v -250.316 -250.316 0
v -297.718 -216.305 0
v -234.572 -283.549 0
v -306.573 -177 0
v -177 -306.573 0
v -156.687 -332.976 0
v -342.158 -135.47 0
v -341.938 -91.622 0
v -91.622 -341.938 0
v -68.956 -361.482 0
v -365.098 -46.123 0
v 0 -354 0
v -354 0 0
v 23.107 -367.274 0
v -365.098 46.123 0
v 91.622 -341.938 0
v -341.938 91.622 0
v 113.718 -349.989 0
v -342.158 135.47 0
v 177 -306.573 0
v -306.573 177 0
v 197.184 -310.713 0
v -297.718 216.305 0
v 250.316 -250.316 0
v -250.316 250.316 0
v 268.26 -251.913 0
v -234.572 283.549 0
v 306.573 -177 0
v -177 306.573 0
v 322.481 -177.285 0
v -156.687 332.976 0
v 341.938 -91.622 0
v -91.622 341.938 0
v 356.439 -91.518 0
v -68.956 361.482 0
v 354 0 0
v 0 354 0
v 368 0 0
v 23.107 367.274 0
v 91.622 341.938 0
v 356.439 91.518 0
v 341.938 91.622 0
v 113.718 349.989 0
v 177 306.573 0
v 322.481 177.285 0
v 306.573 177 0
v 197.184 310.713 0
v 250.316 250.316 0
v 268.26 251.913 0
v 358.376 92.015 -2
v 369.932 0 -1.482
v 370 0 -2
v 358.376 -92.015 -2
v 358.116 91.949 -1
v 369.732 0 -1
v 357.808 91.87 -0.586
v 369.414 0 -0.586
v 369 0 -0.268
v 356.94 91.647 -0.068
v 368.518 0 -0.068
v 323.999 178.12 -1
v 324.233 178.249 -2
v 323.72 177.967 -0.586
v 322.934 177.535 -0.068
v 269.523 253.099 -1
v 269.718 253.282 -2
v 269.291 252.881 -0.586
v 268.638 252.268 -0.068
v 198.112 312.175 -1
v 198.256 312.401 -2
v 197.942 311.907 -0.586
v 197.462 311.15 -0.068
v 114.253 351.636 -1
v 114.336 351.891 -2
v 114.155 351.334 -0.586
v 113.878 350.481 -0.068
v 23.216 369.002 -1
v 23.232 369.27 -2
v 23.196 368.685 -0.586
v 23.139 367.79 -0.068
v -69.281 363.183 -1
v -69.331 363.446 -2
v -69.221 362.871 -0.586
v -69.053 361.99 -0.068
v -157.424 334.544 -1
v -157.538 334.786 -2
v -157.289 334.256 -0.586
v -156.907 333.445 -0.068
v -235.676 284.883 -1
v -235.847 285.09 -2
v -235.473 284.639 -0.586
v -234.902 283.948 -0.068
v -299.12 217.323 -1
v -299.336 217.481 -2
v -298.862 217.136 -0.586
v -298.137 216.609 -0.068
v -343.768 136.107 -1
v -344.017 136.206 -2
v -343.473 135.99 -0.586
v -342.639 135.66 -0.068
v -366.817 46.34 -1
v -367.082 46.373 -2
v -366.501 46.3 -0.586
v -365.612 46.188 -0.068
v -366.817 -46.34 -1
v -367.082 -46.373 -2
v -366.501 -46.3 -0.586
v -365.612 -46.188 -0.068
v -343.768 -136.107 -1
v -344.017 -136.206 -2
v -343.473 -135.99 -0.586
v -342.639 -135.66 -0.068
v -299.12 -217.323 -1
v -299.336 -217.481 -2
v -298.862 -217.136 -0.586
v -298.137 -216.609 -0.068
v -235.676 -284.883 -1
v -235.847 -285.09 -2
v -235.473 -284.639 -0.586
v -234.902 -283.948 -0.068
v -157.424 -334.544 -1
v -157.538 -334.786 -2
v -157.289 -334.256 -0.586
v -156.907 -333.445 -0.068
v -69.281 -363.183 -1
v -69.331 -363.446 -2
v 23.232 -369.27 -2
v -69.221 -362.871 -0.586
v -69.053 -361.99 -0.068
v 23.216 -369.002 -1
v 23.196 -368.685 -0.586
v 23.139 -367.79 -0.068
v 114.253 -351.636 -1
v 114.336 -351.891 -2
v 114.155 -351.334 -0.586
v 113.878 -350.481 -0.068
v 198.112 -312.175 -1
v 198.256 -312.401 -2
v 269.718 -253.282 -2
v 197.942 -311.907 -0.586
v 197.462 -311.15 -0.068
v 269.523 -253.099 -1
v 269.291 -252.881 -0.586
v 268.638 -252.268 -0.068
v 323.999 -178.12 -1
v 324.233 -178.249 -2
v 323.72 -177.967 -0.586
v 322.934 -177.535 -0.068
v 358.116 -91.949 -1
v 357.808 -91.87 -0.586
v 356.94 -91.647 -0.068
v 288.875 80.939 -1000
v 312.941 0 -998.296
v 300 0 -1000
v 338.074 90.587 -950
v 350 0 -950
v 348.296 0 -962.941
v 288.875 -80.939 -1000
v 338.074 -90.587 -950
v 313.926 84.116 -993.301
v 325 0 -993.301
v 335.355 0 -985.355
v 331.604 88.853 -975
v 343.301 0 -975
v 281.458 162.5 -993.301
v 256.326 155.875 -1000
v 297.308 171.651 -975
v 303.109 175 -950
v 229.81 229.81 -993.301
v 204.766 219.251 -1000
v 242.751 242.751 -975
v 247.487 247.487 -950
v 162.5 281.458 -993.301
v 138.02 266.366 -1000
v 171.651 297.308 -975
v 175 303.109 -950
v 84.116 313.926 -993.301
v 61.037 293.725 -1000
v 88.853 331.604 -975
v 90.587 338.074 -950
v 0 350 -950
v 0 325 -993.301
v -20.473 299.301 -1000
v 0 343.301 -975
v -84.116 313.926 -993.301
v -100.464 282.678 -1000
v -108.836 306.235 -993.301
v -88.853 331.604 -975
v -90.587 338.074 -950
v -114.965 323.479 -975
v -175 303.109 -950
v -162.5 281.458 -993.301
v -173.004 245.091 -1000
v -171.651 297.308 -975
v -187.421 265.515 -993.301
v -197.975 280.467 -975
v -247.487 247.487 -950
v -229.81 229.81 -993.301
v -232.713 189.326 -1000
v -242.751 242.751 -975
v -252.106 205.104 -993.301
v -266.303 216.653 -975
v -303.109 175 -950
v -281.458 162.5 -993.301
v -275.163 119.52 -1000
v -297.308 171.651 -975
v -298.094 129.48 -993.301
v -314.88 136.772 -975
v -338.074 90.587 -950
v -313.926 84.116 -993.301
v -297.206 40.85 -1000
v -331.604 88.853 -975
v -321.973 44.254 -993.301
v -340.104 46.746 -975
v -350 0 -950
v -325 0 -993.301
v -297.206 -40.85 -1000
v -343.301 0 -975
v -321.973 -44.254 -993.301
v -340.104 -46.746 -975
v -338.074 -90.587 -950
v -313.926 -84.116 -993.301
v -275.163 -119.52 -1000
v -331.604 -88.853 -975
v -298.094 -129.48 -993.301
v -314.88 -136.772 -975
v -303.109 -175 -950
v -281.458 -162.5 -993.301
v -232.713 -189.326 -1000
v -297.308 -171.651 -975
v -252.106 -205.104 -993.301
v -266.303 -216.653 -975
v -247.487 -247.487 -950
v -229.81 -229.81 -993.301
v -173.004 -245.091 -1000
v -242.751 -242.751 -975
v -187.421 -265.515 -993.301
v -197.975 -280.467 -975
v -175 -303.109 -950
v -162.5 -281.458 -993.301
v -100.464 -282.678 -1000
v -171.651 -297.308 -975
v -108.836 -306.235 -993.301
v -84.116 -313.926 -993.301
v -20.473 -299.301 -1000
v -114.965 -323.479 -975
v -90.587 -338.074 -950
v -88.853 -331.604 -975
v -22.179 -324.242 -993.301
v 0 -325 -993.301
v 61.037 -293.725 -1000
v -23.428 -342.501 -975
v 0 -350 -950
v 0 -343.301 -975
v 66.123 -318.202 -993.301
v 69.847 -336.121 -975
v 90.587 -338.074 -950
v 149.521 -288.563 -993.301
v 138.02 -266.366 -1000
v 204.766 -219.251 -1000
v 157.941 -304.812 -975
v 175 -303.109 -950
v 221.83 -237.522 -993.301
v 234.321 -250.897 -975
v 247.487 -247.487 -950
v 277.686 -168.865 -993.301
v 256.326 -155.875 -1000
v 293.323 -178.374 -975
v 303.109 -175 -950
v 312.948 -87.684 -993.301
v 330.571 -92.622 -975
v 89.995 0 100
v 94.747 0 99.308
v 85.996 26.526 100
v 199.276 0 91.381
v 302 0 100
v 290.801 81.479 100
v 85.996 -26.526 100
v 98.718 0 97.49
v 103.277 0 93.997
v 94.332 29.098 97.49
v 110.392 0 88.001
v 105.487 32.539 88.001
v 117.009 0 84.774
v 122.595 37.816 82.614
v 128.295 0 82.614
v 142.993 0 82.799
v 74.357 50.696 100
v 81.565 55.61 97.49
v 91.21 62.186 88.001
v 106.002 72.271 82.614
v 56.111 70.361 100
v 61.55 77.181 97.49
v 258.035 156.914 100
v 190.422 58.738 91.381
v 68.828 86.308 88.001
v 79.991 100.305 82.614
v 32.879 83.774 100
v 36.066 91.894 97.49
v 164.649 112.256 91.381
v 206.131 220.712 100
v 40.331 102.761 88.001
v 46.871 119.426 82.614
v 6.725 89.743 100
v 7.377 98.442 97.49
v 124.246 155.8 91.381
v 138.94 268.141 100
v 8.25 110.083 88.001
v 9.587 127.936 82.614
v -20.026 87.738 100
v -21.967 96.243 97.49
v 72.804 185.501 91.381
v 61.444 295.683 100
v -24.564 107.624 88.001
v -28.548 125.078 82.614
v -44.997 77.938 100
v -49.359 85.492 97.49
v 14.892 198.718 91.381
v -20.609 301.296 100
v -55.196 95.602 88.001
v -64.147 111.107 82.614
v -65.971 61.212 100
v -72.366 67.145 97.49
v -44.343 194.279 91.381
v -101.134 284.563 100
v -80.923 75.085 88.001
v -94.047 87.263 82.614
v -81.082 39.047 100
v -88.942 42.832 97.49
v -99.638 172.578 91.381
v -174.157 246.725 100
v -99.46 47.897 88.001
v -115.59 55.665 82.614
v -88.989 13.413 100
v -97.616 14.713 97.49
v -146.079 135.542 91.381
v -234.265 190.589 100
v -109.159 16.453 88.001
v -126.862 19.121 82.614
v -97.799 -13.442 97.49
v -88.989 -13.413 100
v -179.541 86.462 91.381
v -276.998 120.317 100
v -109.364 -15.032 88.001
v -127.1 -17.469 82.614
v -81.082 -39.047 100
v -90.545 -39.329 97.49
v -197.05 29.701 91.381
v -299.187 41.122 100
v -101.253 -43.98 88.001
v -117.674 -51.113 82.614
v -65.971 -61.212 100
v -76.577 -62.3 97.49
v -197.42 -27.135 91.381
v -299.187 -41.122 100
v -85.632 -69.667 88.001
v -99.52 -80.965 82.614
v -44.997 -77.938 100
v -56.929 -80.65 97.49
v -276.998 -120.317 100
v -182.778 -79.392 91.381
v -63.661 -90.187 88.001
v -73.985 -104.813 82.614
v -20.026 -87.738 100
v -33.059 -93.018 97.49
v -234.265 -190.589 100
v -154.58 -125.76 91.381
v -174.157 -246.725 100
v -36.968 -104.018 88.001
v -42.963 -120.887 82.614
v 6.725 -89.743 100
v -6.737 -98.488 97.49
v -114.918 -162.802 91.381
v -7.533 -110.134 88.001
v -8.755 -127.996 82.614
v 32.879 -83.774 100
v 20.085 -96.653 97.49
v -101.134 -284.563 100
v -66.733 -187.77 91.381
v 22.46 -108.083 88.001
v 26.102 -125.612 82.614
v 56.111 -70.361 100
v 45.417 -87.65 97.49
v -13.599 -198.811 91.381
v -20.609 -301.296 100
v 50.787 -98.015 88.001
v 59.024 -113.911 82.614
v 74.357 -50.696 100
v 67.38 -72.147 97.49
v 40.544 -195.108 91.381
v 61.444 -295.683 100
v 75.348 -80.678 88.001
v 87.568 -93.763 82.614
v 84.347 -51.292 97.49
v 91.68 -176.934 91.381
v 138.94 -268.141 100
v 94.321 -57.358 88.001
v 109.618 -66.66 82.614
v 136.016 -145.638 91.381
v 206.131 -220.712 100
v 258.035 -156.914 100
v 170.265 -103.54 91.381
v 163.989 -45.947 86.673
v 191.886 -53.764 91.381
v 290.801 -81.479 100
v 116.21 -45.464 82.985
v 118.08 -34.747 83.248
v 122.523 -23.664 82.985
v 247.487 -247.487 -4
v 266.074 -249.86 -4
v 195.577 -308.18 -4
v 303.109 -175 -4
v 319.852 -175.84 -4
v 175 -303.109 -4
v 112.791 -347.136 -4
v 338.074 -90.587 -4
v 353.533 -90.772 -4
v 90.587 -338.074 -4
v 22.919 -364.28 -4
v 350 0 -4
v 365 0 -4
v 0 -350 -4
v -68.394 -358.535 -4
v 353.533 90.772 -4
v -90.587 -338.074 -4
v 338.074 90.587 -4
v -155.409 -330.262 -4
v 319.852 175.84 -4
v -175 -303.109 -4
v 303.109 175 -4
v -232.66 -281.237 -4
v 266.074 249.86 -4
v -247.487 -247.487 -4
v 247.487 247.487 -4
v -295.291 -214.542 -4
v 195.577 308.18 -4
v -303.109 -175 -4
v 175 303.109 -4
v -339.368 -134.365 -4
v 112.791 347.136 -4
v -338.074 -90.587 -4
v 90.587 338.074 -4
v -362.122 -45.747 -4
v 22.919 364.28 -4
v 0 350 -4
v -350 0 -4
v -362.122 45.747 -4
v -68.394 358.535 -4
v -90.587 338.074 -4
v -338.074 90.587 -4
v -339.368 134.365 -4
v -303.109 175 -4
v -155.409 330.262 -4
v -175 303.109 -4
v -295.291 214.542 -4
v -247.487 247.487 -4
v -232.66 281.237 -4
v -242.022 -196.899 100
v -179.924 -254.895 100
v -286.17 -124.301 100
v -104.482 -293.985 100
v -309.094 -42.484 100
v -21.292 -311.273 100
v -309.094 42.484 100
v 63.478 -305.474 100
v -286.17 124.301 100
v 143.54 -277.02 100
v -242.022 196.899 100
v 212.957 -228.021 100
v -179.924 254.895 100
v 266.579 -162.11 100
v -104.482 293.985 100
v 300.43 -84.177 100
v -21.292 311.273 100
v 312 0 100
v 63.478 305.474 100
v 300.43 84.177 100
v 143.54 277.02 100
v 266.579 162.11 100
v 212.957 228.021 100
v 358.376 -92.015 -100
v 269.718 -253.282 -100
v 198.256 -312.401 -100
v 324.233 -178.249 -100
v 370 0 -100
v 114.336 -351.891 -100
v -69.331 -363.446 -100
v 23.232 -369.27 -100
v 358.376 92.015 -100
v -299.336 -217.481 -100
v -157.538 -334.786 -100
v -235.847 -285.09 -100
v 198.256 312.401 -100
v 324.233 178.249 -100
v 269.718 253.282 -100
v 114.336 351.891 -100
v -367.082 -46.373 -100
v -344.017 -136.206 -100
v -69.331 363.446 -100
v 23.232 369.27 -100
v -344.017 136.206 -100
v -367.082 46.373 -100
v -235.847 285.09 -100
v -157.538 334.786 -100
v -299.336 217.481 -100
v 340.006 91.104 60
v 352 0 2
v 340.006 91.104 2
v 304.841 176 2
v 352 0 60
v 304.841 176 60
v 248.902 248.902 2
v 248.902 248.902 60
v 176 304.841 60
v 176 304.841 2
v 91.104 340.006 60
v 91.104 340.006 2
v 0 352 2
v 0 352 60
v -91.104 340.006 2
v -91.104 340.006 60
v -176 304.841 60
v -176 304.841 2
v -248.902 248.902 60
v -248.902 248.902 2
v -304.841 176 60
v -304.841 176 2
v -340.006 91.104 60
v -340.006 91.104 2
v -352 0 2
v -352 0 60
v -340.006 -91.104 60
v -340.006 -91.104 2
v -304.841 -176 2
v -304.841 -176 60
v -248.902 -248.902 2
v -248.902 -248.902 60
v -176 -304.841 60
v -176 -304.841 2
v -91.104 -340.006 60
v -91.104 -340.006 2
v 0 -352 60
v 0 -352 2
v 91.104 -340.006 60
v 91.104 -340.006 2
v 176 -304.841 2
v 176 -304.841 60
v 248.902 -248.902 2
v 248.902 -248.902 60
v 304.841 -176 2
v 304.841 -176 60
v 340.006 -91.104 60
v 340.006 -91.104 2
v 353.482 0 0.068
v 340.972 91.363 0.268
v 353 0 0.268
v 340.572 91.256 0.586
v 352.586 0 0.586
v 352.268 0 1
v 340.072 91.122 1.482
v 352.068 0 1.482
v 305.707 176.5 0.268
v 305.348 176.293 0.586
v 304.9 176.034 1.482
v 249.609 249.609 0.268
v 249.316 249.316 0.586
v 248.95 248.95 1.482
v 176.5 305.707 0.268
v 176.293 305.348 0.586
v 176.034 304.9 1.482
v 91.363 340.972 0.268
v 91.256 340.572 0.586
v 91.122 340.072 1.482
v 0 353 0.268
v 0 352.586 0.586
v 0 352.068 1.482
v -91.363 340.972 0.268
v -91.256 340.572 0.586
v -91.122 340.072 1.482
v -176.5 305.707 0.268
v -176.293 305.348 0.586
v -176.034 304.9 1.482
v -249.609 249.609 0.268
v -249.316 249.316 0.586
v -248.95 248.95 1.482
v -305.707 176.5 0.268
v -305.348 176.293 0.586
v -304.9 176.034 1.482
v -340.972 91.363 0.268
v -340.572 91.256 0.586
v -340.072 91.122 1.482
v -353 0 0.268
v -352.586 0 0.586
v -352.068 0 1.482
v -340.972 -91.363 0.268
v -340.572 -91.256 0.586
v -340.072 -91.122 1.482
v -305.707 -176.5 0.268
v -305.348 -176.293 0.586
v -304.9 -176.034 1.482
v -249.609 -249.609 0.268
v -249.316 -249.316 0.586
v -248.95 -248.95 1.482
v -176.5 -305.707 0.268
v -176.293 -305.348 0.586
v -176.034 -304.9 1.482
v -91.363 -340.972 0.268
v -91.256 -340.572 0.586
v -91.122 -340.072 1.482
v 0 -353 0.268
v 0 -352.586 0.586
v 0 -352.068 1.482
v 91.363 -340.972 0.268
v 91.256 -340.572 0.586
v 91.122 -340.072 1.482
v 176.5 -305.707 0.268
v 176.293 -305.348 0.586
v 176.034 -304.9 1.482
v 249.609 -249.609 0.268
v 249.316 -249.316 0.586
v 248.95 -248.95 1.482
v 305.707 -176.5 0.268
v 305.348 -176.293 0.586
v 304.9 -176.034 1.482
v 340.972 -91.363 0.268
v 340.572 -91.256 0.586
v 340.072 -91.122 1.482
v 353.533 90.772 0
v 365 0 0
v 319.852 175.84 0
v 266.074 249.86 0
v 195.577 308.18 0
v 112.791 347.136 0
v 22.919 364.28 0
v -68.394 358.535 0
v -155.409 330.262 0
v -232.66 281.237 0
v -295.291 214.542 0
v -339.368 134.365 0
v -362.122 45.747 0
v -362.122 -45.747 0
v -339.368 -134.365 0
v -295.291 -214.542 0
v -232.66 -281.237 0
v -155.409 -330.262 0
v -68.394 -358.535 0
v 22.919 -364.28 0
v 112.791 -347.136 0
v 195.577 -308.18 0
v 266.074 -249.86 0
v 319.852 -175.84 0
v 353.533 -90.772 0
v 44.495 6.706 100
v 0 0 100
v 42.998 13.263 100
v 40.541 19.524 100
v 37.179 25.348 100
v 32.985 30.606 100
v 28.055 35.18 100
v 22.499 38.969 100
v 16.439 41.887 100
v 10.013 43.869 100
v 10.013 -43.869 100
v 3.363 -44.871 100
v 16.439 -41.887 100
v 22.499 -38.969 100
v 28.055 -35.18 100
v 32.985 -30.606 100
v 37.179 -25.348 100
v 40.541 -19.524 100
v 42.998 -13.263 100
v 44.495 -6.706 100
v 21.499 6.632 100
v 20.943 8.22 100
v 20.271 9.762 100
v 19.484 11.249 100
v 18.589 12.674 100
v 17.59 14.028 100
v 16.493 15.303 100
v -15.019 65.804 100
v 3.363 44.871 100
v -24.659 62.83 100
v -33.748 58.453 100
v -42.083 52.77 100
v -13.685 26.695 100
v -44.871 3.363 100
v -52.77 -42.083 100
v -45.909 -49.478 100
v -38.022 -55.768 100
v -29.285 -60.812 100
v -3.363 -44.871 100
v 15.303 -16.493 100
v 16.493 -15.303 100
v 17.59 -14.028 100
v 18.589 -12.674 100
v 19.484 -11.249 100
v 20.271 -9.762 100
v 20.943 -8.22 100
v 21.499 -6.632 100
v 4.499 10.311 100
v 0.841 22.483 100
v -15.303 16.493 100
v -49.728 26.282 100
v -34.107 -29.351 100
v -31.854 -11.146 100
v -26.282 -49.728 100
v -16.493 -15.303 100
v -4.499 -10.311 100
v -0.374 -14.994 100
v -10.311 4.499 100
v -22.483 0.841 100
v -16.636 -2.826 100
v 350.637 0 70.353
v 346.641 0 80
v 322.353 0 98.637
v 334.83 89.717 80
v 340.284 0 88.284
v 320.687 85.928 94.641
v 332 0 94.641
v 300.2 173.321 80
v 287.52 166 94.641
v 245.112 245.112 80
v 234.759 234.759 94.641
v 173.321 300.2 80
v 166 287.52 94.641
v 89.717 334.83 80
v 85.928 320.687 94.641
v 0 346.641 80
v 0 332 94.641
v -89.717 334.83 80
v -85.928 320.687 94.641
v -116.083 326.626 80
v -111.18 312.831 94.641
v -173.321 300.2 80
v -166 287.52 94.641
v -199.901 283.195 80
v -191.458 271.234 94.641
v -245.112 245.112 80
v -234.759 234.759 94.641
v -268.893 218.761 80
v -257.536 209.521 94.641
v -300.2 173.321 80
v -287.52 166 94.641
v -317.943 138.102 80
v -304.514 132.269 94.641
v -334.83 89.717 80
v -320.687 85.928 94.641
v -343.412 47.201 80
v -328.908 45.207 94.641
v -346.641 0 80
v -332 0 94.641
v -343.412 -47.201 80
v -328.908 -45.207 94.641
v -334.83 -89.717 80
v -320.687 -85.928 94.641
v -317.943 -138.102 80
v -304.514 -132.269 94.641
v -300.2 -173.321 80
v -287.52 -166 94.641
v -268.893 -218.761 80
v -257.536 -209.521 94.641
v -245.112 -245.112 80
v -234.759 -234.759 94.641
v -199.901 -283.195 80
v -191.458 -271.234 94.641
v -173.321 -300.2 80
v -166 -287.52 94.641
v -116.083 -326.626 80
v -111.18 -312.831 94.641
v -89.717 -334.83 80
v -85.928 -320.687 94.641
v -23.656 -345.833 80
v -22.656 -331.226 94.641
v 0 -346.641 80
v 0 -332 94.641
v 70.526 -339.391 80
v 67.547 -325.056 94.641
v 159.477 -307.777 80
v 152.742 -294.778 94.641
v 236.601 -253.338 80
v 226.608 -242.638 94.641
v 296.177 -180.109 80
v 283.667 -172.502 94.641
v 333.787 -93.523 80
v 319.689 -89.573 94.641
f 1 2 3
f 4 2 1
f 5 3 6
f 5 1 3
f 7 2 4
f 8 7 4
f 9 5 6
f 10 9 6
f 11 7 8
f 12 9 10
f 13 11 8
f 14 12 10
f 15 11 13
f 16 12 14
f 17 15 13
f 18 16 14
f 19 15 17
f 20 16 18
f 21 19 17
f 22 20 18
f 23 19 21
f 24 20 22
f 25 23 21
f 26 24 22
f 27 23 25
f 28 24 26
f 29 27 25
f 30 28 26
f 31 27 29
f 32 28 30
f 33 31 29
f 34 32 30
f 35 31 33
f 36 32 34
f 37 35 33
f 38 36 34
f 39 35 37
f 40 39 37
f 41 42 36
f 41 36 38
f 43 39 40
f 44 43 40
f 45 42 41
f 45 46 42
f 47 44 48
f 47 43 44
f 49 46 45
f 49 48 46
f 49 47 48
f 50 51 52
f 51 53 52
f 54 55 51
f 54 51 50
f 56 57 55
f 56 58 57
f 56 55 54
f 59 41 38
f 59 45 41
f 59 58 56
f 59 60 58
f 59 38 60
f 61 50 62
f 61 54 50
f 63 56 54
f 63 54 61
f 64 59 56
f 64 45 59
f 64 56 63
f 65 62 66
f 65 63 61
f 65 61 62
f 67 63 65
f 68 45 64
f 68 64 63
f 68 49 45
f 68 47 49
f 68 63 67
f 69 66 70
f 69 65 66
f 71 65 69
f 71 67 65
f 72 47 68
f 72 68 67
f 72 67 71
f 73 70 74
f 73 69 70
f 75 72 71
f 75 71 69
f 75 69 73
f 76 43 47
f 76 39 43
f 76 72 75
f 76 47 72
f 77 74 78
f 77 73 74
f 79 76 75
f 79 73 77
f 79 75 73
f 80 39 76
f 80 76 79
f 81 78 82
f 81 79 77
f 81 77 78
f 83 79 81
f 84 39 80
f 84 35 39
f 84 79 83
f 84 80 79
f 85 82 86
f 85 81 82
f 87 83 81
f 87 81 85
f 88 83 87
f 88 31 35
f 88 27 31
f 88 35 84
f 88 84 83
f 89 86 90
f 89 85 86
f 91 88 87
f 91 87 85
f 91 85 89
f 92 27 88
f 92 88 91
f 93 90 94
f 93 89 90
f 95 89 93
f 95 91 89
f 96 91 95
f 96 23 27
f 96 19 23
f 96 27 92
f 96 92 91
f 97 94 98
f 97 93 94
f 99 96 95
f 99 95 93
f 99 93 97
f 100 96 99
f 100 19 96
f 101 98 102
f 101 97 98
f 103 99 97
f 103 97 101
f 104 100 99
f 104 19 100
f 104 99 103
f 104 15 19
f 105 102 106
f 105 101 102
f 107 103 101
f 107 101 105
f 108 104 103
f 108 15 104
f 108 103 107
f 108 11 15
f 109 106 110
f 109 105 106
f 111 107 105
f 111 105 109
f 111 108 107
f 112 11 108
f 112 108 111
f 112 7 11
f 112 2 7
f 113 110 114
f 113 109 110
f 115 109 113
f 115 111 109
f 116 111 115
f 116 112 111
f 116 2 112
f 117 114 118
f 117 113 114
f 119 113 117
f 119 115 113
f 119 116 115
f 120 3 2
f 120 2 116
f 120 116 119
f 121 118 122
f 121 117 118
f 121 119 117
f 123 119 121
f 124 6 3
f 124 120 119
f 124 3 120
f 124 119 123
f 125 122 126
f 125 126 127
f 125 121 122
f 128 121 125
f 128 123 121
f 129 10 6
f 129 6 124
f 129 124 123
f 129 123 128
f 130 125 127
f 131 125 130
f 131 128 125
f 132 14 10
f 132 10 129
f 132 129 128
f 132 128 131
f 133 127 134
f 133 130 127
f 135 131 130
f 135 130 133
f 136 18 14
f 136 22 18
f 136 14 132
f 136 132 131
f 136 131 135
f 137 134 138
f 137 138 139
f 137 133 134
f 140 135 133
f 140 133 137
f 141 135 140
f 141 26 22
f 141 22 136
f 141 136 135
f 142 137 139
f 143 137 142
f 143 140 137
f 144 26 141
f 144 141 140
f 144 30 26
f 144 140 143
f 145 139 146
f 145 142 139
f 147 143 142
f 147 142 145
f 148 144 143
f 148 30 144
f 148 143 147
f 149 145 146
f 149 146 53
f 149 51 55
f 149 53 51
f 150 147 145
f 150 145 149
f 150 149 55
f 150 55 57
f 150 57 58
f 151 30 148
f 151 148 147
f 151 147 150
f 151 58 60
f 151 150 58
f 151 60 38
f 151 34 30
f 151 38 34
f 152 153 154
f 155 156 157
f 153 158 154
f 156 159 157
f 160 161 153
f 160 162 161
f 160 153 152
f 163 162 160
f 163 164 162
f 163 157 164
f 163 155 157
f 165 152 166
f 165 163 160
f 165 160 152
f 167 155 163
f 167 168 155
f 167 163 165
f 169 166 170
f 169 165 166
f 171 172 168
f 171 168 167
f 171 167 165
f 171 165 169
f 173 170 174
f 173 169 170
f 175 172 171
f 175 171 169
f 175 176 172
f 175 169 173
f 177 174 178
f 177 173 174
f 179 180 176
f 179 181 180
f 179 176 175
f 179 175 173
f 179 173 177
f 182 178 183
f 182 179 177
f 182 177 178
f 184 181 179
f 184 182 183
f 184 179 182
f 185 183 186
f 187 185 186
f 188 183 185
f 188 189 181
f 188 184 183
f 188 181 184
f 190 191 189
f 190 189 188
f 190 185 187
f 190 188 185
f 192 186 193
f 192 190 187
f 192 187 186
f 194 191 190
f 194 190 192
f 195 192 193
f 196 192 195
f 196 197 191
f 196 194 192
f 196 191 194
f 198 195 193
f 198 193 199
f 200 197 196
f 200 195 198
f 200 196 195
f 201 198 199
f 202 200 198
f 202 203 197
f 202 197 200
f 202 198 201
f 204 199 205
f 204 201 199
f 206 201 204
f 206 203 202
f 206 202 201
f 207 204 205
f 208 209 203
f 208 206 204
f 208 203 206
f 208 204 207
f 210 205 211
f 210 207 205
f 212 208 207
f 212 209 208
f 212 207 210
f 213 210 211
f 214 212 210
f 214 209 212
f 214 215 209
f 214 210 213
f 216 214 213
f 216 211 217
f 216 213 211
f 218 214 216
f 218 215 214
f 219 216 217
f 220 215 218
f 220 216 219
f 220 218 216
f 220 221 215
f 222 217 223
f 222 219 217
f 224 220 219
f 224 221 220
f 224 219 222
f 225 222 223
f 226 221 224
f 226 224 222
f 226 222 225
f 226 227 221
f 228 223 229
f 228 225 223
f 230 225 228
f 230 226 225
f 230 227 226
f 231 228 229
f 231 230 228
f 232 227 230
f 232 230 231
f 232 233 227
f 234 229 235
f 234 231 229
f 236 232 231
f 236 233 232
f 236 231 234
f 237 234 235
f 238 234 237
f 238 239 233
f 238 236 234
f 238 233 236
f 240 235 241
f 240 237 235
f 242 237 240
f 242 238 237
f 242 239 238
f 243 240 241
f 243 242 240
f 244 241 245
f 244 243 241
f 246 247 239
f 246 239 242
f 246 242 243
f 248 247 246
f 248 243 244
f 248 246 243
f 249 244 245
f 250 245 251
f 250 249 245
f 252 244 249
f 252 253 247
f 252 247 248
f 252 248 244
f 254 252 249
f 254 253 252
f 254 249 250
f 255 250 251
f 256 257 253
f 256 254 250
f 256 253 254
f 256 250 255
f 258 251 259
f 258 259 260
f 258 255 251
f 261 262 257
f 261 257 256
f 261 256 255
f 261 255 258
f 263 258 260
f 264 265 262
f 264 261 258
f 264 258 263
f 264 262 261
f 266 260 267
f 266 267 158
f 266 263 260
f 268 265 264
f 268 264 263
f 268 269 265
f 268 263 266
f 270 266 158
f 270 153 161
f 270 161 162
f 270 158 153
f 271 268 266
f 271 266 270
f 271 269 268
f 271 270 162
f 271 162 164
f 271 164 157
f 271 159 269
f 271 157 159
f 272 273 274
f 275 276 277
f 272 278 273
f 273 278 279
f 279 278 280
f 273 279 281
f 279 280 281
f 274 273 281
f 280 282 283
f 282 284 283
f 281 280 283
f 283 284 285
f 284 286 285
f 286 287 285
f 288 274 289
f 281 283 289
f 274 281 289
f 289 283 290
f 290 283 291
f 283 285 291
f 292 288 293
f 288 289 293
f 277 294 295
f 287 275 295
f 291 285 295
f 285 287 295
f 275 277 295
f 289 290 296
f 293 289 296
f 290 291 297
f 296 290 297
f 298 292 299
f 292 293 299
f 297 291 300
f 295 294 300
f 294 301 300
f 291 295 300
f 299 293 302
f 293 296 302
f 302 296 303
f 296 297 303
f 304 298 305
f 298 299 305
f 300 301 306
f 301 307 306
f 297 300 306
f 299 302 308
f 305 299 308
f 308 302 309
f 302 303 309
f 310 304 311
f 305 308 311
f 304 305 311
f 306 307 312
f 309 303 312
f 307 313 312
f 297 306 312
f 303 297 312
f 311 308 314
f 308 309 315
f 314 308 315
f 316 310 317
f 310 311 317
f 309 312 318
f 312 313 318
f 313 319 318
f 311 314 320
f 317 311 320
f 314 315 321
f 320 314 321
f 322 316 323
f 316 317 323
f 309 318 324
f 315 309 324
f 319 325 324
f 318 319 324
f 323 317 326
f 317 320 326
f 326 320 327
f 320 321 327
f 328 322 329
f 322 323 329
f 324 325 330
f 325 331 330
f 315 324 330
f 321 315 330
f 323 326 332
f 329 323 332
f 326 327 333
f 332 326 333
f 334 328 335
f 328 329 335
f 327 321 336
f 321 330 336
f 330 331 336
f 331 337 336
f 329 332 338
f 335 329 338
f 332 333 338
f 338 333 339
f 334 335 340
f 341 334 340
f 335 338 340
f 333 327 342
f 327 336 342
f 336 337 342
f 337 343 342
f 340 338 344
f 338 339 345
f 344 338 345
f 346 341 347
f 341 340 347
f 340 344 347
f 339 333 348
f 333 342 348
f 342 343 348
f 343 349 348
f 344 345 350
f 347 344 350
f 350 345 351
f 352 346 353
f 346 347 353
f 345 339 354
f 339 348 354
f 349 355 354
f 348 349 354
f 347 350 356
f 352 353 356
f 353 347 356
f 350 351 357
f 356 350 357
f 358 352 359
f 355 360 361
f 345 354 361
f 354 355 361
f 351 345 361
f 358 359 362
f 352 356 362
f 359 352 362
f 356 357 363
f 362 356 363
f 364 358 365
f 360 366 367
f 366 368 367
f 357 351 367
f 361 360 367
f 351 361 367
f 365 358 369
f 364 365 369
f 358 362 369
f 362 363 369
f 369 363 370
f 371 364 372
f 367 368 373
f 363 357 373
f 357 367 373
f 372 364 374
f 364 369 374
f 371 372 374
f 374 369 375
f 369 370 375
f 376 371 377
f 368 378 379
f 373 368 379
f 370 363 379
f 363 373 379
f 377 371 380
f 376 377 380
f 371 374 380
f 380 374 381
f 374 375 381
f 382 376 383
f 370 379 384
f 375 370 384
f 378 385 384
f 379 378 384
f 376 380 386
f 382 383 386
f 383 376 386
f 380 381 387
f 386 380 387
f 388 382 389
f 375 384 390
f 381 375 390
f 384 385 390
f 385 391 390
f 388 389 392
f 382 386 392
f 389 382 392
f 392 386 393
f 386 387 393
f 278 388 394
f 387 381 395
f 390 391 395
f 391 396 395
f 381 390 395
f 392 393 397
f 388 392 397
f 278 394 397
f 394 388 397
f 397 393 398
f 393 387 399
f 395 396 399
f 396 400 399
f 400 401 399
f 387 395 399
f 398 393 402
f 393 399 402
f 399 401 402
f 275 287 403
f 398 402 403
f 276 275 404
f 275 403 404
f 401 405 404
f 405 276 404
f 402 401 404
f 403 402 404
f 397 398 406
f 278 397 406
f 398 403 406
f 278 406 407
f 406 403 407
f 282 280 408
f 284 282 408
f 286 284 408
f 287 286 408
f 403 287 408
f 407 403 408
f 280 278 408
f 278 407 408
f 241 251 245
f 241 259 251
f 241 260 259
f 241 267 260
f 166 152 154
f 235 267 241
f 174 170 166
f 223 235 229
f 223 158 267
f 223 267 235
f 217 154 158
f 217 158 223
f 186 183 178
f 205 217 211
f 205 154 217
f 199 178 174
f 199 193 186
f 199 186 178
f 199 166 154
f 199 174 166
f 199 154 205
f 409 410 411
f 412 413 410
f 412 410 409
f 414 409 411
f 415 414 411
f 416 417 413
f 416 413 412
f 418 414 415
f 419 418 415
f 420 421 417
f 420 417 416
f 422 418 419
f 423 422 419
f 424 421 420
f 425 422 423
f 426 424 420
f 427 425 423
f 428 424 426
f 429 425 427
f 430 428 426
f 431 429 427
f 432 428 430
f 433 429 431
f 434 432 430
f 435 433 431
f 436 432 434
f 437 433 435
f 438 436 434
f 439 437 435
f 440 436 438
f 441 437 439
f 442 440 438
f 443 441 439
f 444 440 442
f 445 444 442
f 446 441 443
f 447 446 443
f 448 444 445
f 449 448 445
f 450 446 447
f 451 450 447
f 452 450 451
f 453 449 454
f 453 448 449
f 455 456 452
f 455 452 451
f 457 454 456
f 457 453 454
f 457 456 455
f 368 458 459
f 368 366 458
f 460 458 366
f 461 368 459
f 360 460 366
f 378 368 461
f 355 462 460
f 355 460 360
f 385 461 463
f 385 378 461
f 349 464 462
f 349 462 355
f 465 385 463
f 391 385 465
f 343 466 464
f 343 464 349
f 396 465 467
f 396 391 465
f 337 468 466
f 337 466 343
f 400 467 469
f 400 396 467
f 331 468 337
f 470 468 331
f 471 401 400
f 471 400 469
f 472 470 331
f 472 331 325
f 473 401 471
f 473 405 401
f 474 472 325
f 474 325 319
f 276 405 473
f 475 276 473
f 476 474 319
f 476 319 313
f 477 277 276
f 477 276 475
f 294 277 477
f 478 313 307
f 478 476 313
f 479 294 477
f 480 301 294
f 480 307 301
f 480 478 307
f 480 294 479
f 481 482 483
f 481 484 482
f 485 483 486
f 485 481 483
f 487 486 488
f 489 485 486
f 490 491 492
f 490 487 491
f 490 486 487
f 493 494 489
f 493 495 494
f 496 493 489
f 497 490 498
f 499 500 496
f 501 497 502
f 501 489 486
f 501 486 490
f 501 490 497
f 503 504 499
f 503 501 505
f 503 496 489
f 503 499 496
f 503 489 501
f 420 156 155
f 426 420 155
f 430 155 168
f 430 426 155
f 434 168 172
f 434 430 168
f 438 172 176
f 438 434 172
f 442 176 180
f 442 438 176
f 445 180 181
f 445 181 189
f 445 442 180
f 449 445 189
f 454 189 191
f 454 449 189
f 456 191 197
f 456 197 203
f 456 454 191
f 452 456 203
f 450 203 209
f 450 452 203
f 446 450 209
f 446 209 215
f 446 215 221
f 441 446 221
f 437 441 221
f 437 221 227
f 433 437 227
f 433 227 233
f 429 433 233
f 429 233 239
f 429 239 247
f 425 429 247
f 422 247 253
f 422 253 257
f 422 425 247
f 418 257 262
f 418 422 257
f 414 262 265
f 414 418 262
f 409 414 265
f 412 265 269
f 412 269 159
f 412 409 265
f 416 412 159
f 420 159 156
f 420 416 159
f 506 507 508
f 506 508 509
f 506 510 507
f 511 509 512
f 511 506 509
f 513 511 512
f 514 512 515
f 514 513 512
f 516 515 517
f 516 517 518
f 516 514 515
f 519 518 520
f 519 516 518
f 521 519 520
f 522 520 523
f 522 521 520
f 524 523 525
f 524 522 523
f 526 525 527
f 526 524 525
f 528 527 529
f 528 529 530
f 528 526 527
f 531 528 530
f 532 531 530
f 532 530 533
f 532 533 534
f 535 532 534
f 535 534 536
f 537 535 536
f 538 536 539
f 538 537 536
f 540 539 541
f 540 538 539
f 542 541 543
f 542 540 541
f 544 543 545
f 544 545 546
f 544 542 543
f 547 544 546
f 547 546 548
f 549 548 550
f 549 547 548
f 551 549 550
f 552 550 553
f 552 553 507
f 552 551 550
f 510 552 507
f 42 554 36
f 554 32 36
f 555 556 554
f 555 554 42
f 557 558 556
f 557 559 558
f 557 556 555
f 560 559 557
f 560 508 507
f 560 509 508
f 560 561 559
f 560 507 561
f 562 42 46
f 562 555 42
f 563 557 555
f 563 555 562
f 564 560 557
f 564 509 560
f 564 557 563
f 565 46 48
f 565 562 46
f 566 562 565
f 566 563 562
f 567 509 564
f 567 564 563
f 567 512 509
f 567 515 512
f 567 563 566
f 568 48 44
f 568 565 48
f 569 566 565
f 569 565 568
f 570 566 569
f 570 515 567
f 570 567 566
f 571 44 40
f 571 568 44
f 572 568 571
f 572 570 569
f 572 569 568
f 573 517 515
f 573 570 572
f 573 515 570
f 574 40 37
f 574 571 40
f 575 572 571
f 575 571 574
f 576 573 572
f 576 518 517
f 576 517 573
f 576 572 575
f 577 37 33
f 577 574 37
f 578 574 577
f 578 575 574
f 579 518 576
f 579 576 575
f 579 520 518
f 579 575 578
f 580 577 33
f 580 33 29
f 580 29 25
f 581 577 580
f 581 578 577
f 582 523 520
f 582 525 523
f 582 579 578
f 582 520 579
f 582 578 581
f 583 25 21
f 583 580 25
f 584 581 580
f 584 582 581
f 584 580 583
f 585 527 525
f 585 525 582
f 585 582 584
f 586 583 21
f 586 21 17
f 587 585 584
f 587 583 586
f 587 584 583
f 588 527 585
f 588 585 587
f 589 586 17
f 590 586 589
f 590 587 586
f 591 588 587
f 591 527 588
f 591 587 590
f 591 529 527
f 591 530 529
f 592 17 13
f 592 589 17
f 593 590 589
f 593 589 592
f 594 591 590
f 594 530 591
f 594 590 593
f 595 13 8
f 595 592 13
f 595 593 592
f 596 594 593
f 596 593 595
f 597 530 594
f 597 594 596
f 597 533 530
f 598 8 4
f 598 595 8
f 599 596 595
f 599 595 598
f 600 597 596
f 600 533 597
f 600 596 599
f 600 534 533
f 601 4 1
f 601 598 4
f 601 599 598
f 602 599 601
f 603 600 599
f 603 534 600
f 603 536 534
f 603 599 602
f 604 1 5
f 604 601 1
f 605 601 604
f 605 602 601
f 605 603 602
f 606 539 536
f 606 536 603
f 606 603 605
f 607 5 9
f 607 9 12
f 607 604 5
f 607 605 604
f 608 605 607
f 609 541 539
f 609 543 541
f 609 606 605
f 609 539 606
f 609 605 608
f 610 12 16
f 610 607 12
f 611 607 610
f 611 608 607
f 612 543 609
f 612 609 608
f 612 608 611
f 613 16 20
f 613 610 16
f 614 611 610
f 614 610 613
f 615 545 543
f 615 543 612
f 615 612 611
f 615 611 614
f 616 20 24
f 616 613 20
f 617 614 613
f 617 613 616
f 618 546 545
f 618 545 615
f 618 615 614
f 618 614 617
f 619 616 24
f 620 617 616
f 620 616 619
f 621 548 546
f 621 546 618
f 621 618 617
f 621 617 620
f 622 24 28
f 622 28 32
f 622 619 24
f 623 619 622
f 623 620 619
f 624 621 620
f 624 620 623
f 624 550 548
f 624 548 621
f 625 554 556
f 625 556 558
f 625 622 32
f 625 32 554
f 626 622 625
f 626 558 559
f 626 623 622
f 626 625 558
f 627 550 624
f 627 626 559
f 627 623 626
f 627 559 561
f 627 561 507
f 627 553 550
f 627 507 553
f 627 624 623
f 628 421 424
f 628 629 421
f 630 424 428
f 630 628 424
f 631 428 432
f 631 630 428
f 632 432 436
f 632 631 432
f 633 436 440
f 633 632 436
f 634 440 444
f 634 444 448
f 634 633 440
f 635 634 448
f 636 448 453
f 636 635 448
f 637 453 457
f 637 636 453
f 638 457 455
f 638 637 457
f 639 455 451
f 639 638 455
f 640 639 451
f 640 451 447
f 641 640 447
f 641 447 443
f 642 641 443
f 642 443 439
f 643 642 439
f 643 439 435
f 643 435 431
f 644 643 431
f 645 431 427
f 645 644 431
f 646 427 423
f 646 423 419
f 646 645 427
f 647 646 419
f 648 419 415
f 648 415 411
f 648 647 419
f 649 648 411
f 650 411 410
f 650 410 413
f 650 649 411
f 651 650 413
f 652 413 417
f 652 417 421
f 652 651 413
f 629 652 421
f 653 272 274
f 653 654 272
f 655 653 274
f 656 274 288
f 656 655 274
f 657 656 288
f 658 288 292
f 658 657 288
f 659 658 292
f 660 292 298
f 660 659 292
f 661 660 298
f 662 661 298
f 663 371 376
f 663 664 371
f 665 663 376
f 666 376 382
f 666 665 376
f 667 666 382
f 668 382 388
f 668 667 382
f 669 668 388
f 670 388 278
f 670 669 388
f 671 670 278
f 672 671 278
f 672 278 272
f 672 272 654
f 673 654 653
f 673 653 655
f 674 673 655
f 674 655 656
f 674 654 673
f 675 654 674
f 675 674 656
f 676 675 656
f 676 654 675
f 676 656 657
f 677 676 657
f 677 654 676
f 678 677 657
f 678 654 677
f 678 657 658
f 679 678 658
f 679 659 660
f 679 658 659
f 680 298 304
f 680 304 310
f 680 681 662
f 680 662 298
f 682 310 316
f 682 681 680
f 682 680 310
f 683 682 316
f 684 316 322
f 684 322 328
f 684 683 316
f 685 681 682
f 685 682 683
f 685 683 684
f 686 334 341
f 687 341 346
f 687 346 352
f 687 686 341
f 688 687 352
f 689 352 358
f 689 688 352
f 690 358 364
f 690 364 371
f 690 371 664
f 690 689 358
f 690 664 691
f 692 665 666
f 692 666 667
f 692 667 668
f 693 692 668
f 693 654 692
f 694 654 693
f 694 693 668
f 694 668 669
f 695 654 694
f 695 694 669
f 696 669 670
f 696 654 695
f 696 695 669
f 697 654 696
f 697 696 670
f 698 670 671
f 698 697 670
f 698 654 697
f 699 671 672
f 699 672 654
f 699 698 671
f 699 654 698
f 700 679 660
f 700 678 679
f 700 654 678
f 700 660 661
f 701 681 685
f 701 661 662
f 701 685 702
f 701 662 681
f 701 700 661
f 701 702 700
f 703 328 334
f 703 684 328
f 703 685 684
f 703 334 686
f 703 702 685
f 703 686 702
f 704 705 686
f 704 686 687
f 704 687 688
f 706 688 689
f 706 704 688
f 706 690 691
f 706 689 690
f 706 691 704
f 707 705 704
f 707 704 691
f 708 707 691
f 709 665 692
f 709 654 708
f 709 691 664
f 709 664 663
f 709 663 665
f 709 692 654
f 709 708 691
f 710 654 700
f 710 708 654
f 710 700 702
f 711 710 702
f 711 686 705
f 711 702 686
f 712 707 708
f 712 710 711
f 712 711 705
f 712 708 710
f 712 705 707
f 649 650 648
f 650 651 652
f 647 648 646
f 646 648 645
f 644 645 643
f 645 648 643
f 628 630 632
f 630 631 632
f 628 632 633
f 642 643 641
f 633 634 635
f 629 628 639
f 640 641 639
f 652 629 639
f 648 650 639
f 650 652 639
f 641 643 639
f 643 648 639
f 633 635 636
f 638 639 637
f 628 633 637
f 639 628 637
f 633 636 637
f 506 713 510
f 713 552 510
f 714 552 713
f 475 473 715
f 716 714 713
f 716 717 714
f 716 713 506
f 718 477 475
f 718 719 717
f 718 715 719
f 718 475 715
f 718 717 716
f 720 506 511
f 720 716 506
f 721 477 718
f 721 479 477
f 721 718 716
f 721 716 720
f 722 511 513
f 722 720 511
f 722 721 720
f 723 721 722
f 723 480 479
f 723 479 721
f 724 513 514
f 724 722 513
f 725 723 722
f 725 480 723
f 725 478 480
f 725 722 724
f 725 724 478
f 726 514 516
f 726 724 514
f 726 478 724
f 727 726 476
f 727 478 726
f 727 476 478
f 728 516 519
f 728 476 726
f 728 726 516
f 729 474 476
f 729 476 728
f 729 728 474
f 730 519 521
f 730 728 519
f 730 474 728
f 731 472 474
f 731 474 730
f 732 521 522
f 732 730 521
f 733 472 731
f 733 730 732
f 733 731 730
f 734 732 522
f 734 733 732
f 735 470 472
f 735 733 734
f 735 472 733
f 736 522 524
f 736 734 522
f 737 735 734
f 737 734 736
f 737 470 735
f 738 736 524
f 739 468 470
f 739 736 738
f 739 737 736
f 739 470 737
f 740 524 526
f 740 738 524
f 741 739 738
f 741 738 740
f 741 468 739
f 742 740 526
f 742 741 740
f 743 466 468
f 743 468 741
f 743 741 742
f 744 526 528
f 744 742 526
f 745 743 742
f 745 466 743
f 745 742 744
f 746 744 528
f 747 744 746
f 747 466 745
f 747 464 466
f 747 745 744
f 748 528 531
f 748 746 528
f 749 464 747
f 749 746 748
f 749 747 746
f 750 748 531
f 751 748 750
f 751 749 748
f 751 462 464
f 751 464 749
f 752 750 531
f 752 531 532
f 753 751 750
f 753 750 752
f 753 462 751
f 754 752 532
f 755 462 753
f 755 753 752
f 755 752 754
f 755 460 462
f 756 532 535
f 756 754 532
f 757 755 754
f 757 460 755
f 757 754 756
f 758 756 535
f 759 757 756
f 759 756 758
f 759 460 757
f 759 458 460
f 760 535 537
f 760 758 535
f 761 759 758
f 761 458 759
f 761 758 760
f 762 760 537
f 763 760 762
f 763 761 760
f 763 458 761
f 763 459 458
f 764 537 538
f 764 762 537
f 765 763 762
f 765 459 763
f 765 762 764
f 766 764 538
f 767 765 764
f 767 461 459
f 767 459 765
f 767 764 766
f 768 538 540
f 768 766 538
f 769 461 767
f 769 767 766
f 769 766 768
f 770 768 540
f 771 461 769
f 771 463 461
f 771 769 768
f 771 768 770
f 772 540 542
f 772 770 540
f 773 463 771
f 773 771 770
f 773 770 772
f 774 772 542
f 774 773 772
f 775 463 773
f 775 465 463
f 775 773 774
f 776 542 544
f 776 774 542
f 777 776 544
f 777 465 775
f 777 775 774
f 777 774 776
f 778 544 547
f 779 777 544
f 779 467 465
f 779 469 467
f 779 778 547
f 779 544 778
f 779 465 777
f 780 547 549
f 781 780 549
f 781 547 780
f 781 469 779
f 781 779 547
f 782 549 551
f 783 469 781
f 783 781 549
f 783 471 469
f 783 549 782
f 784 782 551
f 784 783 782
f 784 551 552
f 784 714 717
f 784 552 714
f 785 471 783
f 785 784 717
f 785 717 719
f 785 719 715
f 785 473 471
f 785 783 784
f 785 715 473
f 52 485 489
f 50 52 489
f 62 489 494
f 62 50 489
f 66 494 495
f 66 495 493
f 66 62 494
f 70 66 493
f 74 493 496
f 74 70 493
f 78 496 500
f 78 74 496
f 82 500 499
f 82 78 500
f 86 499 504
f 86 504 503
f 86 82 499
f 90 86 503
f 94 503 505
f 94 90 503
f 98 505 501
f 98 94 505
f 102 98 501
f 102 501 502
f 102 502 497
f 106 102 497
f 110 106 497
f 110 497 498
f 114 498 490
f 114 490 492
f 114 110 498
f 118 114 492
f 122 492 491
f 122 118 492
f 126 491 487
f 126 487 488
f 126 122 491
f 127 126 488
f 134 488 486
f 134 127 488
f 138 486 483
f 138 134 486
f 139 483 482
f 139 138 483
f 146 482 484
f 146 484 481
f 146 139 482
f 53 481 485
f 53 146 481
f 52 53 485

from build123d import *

# Parameters (mm, degrees)
F2_W = 15
F2_H = 4


# Not quite as in the source:
# - ends of sketch curves that miss each other by under 0.0002 mm in the source are joined


with BuildPart() as f1:
    # F0 (on Front) → F1 (revolve)
    with BuildSketch(Plane.XZ):
        with BuildLine():
            Line((350, -950), (350, 0))
            Line((350, 0), (0, 0))
            Line((0, 0), (0, -1000))
            Line((0, -1000), (300, -1000))
            ThreePointArc((300, -1000), (335.3553390593, -985.3553390593), (350, -950))
        make_face()
    revolve(axis=Axis((0, 0, -563.781440258), (0, 0, 1)))

    # F2 (on Front) → F3 (revolve)
    with BuildSketch(Plane.XZ):
        with Locations((357.5, -2)):
            Rectangle(F2_W, F2_H)
    revolve(axis=Axis((0, 0, -500), (0, 0, 1)))


with BuildPart() as f5:
    # F4 (on Front) → F5 (revolve)
    with BuildSketch(Plane.XZ):
        with BuildLine():
            Line((368, 0), (354, 0))
            ThreePointArc((354, 0), (352.5857864376, 0.5857864376), (352, 2))
            Line((352, 2), (352, 60))
            ThreePointArc((352, 60), (340.2842712475, 88.2842712475), (312, 100))
            Line((312, 100), (302, 100))
            add(Edge.make_bspline(
                [(90, 100), (99.4711880321, 100), (108.4193994424, 84.3913848943), (139.1428176435, 80.5684134054), (181.851883894, 89.2072392235), (234.6883361244, 96.2560851887), (267.4291003084, 100), (302, 100)],
                knots=[2.85798e-05, 2.85798e-05, 2.85798e-05, 2.85798e-05, 0.1499893339, 0.3139008613, 0.5198138943, 0.7376397347, 1, 1, 1, 1], degree=3))
            add(Edge.make_bspline(
                [(89.994584319, 99.9999991873), (89.9963897347, 99.9999997291), (89.9981949617, 100), (90, 100)],
                knots=[0, 0, 0, 0, 2.85798e-05, 2.85798e-05, 2.85798e-05, 2.85798e-05], degree=3))
            Line((89.994584319, 99.9999991873), (0, 100))
            Line((0, 100), (0, -100))
            Line((0, -100), (370, -100))
            Line((370, -100), (370, -2))
            ThreePointArc((370, -2), (369.4142135624, -0.5857864376), (368, 0))
        make_face()
    revolve(axis=Axis((0, 0, 0), (0, 0, 1)))


solid = Compound([f1.part, f5.part])
